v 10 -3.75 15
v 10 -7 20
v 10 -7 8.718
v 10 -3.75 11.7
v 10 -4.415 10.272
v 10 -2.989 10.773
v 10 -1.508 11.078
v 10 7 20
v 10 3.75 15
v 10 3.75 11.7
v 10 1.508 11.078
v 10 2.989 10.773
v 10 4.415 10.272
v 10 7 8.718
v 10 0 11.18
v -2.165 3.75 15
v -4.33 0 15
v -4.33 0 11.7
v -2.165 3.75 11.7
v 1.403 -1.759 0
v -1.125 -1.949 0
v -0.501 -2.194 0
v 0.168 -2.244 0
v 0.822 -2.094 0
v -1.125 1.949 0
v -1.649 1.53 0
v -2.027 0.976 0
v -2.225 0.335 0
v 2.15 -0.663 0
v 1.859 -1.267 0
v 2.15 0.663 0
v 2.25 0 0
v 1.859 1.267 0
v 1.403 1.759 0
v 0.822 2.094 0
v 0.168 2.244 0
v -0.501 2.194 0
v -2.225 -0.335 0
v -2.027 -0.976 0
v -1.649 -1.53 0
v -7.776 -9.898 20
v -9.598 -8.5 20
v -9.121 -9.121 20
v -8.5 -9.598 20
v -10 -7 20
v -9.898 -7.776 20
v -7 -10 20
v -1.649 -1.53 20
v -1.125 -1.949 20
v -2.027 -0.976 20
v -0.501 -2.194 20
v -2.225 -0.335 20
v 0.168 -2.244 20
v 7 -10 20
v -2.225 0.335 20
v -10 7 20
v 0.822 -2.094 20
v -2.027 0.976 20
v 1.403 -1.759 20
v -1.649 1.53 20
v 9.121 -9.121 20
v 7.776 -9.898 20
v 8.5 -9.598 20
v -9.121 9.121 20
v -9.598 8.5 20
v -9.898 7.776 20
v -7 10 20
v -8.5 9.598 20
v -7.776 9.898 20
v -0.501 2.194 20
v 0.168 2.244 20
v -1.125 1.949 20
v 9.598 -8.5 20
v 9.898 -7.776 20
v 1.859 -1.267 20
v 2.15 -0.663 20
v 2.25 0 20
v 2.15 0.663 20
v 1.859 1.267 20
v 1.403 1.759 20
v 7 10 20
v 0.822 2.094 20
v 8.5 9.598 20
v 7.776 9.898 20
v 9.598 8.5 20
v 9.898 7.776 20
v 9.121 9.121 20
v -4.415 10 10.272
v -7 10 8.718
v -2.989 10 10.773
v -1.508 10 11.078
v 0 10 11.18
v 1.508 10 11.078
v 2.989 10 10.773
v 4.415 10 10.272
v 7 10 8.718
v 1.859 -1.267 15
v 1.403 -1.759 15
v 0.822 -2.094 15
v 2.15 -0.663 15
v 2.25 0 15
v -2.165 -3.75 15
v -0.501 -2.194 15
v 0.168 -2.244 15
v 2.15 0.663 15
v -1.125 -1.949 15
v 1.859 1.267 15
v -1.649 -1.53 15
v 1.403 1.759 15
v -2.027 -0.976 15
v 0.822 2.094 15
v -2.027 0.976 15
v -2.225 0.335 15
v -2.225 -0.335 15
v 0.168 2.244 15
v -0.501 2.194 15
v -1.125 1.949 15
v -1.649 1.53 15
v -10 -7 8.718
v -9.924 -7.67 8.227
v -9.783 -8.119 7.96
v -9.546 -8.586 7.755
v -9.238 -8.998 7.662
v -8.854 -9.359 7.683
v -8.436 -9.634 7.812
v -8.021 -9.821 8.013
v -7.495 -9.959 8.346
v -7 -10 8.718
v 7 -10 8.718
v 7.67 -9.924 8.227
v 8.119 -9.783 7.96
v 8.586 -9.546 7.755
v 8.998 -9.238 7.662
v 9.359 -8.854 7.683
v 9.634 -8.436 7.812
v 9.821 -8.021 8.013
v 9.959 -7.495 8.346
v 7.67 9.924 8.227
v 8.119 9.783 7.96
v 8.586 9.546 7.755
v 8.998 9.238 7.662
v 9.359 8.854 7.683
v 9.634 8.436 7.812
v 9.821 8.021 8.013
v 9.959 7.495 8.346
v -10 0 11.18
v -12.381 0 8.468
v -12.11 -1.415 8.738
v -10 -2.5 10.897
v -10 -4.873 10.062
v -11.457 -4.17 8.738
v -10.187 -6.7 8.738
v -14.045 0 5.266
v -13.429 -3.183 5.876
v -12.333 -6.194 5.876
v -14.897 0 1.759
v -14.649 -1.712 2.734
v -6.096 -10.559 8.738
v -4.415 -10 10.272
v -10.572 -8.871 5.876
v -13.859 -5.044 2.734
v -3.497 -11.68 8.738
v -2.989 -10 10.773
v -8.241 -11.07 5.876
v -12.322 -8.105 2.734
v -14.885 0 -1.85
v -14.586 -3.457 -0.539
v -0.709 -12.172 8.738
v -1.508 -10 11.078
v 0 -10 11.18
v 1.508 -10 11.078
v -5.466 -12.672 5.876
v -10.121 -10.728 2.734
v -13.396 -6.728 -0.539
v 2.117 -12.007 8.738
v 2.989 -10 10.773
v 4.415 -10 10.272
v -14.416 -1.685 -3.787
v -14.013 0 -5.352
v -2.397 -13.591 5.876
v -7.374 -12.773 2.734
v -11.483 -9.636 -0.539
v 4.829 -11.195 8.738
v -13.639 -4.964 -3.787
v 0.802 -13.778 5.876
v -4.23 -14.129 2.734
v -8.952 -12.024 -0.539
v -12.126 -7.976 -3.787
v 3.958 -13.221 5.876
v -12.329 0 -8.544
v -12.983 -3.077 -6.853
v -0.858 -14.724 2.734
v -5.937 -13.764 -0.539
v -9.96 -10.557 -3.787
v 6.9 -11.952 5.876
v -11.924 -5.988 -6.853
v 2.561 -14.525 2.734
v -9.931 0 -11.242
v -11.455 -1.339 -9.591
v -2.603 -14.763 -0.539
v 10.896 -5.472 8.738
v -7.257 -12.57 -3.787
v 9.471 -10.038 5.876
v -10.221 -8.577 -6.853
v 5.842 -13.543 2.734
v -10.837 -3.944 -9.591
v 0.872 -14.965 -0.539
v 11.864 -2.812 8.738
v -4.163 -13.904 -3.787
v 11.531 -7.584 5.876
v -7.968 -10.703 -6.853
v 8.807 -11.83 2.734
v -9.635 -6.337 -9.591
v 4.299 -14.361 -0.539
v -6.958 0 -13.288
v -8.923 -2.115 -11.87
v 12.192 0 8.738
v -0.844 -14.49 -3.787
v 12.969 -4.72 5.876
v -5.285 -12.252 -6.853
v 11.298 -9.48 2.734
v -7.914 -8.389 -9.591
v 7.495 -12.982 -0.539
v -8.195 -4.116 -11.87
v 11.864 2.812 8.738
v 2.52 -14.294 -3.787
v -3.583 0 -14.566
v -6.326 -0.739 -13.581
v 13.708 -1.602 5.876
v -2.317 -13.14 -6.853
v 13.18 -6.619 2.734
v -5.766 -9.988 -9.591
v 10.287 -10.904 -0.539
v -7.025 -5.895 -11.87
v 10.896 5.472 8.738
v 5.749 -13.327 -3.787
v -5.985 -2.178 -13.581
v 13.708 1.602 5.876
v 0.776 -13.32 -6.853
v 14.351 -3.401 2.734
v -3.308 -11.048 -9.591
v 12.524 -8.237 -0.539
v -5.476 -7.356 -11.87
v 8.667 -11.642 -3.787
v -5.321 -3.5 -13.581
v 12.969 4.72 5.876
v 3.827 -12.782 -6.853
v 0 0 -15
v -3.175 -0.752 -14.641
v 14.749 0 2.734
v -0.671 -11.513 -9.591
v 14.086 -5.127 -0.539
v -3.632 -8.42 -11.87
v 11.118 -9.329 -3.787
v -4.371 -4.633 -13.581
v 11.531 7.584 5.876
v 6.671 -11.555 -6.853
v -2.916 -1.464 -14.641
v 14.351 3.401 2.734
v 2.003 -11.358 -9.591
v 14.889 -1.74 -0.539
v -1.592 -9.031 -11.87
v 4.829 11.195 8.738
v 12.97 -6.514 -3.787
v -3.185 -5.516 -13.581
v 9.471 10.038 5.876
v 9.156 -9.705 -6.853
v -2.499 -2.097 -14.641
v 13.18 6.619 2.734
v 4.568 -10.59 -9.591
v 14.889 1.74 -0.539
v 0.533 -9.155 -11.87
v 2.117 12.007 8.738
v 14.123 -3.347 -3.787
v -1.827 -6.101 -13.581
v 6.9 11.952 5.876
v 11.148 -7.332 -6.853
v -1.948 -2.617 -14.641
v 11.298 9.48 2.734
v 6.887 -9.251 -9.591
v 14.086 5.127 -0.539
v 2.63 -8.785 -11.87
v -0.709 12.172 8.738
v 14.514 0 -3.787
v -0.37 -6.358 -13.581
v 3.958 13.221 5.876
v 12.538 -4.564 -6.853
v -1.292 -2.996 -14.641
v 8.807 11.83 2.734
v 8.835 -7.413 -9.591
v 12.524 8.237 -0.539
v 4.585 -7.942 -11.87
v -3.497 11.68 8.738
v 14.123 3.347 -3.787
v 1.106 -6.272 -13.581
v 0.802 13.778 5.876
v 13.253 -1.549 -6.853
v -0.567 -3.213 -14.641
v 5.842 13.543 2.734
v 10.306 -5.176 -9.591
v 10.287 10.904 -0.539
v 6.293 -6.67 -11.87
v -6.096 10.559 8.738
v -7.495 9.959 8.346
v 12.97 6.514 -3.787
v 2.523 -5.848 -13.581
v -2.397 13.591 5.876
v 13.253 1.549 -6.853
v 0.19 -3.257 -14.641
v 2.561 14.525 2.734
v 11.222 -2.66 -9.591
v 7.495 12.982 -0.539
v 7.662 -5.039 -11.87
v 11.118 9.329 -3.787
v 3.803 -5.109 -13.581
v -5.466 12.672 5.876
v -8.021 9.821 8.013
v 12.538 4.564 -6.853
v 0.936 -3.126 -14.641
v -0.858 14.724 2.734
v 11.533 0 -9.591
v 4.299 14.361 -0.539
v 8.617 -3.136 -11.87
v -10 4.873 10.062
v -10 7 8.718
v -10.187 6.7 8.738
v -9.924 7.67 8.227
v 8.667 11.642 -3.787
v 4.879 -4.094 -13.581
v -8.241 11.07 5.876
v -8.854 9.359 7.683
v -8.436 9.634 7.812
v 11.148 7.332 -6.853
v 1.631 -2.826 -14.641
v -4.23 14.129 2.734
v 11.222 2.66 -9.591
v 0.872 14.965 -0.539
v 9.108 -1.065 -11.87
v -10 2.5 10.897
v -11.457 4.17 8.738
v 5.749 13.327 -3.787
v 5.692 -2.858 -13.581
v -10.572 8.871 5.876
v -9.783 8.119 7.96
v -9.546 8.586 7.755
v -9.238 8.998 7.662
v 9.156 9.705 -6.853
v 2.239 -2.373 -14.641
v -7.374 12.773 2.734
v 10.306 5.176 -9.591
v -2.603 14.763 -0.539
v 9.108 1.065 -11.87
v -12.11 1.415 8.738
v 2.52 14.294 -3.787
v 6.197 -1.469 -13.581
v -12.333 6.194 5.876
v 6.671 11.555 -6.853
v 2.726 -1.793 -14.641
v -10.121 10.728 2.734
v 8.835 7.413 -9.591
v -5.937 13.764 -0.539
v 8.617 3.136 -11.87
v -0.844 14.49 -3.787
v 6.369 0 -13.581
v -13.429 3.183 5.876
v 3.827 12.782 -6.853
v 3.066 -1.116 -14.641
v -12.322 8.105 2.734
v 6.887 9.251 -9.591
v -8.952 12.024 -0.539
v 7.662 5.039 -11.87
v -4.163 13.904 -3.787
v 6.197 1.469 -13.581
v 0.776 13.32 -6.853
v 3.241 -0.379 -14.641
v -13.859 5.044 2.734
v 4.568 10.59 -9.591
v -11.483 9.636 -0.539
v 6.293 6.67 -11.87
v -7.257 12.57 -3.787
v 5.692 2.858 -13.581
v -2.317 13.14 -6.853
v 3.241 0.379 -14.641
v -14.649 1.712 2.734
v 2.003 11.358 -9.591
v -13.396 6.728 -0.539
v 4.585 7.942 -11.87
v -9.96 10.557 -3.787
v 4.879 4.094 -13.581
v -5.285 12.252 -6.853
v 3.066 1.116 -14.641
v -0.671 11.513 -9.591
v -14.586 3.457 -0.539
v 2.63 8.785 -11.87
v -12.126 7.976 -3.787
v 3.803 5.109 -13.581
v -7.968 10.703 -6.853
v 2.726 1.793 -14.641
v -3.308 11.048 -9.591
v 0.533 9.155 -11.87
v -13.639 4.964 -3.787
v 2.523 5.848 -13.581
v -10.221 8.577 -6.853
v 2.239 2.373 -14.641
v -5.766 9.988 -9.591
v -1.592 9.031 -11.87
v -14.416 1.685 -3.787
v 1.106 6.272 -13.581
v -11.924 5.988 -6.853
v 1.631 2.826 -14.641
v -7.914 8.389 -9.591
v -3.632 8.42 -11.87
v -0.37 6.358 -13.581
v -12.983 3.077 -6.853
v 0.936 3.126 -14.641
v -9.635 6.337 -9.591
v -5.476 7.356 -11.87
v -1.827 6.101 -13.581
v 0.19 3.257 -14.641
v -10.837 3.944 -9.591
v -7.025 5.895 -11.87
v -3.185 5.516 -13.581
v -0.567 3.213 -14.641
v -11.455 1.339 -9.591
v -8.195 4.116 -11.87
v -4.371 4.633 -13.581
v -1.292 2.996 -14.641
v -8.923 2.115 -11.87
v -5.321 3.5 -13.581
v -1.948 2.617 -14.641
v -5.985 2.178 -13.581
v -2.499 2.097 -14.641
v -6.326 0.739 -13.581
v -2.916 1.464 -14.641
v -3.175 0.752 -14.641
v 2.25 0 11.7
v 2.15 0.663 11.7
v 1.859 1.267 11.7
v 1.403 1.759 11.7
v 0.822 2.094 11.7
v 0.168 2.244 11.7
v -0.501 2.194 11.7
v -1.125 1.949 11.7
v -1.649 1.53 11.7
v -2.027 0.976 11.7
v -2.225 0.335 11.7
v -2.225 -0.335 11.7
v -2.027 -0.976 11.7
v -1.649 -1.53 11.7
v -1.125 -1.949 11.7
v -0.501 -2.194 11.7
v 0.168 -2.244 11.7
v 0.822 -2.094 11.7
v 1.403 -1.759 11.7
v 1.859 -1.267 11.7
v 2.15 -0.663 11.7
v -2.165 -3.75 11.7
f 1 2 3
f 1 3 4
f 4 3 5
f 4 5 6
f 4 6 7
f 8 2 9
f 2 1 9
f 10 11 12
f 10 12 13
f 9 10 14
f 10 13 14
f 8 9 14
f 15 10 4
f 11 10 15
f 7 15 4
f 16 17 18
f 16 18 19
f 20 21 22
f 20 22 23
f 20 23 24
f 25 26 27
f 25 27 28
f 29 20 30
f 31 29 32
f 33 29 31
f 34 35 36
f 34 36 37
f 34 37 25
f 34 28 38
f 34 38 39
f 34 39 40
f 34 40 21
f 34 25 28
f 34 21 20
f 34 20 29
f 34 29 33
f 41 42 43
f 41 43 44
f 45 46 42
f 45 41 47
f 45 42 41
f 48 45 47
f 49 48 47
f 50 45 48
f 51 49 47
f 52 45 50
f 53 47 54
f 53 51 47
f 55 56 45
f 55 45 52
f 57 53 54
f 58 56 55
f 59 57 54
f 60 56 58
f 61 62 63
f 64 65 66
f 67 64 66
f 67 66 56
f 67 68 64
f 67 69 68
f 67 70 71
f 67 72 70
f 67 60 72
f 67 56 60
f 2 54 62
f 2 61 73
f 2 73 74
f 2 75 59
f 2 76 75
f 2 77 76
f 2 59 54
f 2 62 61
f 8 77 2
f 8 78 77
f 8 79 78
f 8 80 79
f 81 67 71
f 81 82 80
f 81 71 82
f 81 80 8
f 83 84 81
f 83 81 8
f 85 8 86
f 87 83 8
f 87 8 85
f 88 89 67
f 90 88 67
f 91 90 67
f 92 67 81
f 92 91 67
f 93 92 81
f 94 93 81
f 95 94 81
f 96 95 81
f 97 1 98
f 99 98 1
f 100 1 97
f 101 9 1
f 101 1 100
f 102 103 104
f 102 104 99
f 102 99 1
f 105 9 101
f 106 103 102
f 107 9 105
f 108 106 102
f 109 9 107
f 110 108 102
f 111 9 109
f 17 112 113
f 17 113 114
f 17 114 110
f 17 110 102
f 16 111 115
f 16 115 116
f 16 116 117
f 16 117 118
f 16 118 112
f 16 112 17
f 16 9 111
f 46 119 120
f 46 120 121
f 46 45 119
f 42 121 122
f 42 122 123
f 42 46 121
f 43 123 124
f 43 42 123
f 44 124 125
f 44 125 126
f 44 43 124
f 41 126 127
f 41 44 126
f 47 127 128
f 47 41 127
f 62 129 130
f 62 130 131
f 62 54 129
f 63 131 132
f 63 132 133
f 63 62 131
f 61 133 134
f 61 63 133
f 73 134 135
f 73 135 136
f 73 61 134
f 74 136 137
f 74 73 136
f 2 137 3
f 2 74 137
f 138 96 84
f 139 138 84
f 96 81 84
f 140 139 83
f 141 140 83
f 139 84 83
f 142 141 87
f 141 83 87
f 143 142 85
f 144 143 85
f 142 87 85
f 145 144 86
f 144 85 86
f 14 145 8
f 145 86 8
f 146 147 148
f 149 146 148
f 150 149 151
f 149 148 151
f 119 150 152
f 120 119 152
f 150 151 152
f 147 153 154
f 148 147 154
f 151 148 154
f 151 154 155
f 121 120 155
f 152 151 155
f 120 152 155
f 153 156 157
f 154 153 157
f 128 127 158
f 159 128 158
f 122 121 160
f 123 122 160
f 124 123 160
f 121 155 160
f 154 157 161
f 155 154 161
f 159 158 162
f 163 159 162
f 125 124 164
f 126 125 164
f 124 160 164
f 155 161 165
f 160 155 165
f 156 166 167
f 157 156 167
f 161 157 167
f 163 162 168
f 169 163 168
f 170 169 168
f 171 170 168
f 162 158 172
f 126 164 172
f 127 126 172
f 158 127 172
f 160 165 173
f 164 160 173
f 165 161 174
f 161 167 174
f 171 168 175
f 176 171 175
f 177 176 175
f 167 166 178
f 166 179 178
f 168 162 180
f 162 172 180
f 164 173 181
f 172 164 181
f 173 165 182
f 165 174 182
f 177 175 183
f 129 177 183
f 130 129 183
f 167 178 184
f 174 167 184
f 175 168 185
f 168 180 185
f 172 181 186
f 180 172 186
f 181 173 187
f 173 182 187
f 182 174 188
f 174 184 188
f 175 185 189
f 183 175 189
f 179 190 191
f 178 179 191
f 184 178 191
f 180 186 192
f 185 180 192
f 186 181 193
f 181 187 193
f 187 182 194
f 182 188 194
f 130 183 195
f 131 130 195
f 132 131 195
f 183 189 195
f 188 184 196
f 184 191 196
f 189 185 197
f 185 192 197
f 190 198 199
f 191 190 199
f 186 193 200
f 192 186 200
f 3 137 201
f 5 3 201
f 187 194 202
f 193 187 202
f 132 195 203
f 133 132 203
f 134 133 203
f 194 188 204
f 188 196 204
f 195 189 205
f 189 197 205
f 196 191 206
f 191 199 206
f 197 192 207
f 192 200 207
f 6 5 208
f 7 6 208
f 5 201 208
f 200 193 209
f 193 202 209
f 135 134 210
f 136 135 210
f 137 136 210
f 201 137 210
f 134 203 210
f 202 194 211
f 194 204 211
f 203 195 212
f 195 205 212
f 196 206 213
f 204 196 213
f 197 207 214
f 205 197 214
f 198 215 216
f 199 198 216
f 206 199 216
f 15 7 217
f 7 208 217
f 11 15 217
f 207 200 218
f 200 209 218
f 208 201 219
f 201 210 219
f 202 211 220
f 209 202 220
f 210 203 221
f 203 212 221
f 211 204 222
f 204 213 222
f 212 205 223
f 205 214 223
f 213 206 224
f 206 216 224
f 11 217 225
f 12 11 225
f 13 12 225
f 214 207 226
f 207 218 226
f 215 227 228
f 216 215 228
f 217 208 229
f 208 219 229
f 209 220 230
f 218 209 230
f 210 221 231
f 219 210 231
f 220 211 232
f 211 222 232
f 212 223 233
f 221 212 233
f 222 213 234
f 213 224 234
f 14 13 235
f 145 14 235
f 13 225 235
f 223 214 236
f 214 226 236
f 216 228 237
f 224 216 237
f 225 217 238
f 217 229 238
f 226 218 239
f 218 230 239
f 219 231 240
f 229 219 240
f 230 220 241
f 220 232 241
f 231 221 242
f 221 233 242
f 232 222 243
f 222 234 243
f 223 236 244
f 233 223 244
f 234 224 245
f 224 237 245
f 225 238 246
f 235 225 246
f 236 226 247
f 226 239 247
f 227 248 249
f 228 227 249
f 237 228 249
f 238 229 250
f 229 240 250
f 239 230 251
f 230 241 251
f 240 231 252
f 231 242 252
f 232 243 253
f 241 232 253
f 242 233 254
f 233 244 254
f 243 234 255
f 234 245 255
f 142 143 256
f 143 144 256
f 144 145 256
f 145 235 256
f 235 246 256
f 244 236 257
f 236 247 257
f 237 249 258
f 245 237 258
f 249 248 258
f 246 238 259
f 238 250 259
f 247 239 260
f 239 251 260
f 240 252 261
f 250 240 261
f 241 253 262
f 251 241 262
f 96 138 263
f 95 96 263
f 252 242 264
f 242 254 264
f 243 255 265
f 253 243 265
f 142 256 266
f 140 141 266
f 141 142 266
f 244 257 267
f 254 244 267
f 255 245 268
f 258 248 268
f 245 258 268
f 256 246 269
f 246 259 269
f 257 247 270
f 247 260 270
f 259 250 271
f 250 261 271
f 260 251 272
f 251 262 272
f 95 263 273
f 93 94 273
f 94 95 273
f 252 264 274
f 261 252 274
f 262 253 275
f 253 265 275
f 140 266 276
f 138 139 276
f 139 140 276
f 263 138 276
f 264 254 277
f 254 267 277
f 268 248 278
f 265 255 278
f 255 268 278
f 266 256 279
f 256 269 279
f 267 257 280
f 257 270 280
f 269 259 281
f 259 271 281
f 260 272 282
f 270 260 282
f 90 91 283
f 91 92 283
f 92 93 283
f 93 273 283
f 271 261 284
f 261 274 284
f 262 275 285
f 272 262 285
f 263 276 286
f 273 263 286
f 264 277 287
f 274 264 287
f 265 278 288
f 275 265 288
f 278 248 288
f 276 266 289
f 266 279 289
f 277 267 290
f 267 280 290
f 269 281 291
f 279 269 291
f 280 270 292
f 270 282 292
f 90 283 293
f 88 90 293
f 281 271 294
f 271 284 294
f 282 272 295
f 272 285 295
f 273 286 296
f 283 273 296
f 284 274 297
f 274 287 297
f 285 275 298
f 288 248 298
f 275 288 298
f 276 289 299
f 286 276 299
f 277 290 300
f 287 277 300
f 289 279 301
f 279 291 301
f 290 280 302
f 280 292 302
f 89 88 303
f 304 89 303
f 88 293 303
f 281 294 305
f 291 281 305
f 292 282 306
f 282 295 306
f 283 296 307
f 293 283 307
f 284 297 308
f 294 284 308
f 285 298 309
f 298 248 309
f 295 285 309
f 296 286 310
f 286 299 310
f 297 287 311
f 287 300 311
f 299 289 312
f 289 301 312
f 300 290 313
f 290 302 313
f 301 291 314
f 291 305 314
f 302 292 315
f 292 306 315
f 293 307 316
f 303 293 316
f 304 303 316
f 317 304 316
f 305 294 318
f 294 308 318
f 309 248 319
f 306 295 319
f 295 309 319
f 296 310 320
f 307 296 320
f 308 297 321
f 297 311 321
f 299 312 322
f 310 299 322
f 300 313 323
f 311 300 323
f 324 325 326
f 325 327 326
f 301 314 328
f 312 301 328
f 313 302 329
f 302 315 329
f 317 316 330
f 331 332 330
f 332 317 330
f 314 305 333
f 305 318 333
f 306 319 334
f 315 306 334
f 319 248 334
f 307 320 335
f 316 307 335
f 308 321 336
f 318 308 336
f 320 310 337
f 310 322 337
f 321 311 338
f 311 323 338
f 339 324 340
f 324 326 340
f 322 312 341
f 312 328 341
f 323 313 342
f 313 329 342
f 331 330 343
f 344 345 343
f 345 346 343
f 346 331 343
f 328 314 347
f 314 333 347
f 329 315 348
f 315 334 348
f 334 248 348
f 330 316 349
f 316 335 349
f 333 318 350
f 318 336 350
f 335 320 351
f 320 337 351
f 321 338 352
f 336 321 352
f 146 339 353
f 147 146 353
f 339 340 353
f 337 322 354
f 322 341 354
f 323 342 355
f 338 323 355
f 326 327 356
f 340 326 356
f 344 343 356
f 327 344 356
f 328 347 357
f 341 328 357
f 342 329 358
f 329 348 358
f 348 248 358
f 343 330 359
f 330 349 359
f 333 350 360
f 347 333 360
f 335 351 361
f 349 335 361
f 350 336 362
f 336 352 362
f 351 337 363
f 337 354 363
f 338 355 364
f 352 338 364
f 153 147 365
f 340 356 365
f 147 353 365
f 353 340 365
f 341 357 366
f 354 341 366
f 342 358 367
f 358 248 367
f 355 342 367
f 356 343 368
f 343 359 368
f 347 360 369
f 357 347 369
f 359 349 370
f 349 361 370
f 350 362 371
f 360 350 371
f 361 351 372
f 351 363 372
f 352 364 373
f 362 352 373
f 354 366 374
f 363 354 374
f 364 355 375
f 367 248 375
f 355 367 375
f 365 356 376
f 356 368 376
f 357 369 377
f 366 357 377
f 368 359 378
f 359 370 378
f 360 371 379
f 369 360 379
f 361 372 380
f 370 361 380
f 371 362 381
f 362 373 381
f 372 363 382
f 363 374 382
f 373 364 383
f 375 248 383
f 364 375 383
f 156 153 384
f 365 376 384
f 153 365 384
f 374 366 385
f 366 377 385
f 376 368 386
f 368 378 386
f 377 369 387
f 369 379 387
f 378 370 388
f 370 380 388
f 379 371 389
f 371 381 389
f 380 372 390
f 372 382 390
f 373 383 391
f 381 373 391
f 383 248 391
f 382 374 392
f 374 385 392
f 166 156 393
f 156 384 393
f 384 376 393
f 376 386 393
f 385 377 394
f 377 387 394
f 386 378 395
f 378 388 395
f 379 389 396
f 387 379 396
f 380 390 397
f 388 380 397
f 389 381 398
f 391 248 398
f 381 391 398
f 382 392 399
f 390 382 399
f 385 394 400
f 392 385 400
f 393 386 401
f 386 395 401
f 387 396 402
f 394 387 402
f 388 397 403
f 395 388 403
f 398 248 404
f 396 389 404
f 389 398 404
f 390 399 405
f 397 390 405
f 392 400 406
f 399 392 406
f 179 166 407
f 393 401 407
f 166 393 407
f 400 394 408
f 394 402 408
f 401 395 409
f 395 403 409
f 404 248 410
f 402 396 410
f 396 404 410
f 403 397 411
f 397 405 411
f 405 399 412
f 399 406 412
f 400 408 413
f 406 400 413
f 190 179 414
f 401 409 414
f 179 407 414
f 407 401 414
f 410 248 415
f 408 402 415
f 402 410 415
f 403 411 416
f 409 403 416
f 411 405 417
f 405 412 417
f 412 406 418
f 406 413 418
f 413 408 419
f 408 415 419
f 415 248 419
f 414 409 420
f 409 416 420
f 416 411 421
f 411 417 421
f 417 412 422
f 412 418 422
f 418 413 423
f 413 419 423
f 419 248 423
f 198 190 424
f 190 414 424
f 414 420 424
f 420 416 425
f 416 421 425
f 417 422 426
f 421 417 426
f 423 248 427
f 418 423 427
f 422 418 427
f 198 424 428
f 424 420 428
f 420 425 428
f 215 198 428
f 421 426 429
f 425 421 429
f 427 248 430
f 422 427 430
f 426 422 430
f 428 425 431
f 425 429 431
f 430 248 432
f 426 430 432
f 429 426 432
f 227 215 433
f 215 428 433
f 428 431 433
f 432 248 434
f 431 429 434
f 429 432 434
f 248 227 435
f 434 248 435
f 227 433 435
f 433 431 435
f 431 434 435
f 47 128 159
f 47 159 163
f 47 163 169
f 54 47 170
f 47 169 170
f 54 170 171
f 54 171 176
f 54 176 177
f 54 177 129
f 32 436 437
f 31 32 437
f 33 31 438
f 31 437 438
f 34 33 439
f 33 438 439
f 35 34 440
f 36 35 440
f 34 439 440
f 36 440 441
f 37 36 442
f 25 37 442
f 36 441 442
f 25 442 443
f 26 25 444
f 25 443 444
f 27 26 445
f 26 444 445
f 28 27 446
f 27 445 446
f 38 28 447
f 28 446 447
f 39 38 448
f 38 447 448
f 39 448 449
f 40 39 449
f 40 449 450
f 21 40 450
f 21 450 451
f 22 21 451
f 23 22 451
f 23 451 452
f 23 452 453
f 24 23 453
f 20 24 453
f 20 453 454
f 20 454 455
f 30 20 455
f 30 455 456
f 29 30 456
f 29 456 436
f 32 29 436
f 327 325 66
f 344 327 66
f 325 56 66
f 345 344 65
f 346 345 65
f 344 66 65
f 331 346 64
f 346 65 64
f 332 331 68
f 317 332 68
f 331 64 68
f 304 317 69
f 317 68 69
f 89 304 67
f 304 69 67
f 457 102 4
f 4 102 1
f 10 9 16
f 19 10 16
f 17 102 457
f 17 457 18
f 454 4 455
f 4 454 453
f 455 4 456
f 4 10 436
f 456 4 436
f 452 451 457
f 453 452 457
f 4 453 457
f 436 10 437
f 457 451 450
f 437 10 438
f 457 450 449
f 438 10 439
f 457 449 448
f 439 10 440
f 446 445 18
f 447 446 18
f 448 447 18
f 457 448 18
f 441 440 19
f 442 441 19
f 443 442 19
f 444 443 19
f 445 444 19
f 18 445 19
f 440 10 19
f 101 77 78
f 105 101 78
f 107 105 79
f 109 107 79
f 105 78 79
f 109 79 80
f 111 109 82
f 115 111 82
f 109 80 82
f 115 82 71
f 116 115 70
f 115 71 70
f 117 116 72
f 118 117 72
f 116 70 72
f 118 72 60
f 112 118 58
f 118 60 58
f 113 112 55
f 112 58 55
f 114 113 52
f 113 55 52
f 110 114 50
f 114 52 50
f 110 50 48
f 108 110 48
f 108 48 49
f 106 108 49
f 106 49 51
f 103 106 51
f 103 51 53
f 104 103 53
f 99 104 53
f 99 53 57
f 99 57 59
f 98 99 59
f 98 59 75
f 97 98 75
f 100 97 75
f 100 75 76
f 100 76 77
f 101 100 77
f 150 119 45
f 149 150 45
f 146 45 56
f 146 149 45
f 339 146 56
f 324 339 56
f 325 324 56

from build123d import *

# Parameters (mm, degrees)
SKETCH2_W           = 20
SKETCH2_H           = 20
BOSS_EXTRUDE1_DEPTH = 20
SKETCH3_R           = 2.25
CUT_EXTRUDE1_DEPTH  = 20
CUT_EXTRUDE2_DEPTH  = 3.3
FILLET1_R           = 3


with BuildPart() as part:
    # Sketch1 → Revolve1 (revolve)
    with BuildSketch(Plane(origin=(0, 0, 0), x_dir=(1, 0, 0), z_dir=(0, 1, 0))):
        with BuildLine():
            Line((0, 15), (0, -15))
            ThreePointArc((0, -15), (-15, 0), (0, 15))
        make_face()
    revolve(axis=Axis((0, 0, -15), (0, 0, 1)))

    # Sketch2 → Boss-Extrude1 (add)
    with BuildSketch(Plane.XY):
        Rectangle(SKETCH2_W, SKETCH2_H)
    extrude(amount=BOSS_EXTRUDE1_DEPTH)

    # Sketch3 → Cut-Extrude1 (cut)
    with BuildSketch(Plane.XY.offset(20)):
        Circle(SKETCH3_R)
    extrude(amount=-CUT_EXTRUDE1_DEPTH, mode=Mode.SUBTRACT)

    # Sketch4 → Cut-Extrude2 (cut)
    with BuildSketch(Plane.XY.offset(15)):
        Polygon((2.165063509, 3.75), (10, 3.75), (10, -3.75), (2.165063509, -3.75), (-2.165063509, -3.75), (-4.330127019, 0), (-2.165063509, 3.75), align=None)
    extrude(amount=-CUT_EXTRUDE2_DEPTH, mode=Mode.SUBTRACT)

    # Fillet1
    fillet1_edges = [part.edges().sort_by_distance(p)[0] for p in [
        (10, -10, 12.5),
        (10, 10, 12.5),
        (-10, 10, 12.5),
        (-10, -10, 12.5),
    ]]
    fillet(fillet1_edges, radius=FILLET1_R)


solid = part.part
